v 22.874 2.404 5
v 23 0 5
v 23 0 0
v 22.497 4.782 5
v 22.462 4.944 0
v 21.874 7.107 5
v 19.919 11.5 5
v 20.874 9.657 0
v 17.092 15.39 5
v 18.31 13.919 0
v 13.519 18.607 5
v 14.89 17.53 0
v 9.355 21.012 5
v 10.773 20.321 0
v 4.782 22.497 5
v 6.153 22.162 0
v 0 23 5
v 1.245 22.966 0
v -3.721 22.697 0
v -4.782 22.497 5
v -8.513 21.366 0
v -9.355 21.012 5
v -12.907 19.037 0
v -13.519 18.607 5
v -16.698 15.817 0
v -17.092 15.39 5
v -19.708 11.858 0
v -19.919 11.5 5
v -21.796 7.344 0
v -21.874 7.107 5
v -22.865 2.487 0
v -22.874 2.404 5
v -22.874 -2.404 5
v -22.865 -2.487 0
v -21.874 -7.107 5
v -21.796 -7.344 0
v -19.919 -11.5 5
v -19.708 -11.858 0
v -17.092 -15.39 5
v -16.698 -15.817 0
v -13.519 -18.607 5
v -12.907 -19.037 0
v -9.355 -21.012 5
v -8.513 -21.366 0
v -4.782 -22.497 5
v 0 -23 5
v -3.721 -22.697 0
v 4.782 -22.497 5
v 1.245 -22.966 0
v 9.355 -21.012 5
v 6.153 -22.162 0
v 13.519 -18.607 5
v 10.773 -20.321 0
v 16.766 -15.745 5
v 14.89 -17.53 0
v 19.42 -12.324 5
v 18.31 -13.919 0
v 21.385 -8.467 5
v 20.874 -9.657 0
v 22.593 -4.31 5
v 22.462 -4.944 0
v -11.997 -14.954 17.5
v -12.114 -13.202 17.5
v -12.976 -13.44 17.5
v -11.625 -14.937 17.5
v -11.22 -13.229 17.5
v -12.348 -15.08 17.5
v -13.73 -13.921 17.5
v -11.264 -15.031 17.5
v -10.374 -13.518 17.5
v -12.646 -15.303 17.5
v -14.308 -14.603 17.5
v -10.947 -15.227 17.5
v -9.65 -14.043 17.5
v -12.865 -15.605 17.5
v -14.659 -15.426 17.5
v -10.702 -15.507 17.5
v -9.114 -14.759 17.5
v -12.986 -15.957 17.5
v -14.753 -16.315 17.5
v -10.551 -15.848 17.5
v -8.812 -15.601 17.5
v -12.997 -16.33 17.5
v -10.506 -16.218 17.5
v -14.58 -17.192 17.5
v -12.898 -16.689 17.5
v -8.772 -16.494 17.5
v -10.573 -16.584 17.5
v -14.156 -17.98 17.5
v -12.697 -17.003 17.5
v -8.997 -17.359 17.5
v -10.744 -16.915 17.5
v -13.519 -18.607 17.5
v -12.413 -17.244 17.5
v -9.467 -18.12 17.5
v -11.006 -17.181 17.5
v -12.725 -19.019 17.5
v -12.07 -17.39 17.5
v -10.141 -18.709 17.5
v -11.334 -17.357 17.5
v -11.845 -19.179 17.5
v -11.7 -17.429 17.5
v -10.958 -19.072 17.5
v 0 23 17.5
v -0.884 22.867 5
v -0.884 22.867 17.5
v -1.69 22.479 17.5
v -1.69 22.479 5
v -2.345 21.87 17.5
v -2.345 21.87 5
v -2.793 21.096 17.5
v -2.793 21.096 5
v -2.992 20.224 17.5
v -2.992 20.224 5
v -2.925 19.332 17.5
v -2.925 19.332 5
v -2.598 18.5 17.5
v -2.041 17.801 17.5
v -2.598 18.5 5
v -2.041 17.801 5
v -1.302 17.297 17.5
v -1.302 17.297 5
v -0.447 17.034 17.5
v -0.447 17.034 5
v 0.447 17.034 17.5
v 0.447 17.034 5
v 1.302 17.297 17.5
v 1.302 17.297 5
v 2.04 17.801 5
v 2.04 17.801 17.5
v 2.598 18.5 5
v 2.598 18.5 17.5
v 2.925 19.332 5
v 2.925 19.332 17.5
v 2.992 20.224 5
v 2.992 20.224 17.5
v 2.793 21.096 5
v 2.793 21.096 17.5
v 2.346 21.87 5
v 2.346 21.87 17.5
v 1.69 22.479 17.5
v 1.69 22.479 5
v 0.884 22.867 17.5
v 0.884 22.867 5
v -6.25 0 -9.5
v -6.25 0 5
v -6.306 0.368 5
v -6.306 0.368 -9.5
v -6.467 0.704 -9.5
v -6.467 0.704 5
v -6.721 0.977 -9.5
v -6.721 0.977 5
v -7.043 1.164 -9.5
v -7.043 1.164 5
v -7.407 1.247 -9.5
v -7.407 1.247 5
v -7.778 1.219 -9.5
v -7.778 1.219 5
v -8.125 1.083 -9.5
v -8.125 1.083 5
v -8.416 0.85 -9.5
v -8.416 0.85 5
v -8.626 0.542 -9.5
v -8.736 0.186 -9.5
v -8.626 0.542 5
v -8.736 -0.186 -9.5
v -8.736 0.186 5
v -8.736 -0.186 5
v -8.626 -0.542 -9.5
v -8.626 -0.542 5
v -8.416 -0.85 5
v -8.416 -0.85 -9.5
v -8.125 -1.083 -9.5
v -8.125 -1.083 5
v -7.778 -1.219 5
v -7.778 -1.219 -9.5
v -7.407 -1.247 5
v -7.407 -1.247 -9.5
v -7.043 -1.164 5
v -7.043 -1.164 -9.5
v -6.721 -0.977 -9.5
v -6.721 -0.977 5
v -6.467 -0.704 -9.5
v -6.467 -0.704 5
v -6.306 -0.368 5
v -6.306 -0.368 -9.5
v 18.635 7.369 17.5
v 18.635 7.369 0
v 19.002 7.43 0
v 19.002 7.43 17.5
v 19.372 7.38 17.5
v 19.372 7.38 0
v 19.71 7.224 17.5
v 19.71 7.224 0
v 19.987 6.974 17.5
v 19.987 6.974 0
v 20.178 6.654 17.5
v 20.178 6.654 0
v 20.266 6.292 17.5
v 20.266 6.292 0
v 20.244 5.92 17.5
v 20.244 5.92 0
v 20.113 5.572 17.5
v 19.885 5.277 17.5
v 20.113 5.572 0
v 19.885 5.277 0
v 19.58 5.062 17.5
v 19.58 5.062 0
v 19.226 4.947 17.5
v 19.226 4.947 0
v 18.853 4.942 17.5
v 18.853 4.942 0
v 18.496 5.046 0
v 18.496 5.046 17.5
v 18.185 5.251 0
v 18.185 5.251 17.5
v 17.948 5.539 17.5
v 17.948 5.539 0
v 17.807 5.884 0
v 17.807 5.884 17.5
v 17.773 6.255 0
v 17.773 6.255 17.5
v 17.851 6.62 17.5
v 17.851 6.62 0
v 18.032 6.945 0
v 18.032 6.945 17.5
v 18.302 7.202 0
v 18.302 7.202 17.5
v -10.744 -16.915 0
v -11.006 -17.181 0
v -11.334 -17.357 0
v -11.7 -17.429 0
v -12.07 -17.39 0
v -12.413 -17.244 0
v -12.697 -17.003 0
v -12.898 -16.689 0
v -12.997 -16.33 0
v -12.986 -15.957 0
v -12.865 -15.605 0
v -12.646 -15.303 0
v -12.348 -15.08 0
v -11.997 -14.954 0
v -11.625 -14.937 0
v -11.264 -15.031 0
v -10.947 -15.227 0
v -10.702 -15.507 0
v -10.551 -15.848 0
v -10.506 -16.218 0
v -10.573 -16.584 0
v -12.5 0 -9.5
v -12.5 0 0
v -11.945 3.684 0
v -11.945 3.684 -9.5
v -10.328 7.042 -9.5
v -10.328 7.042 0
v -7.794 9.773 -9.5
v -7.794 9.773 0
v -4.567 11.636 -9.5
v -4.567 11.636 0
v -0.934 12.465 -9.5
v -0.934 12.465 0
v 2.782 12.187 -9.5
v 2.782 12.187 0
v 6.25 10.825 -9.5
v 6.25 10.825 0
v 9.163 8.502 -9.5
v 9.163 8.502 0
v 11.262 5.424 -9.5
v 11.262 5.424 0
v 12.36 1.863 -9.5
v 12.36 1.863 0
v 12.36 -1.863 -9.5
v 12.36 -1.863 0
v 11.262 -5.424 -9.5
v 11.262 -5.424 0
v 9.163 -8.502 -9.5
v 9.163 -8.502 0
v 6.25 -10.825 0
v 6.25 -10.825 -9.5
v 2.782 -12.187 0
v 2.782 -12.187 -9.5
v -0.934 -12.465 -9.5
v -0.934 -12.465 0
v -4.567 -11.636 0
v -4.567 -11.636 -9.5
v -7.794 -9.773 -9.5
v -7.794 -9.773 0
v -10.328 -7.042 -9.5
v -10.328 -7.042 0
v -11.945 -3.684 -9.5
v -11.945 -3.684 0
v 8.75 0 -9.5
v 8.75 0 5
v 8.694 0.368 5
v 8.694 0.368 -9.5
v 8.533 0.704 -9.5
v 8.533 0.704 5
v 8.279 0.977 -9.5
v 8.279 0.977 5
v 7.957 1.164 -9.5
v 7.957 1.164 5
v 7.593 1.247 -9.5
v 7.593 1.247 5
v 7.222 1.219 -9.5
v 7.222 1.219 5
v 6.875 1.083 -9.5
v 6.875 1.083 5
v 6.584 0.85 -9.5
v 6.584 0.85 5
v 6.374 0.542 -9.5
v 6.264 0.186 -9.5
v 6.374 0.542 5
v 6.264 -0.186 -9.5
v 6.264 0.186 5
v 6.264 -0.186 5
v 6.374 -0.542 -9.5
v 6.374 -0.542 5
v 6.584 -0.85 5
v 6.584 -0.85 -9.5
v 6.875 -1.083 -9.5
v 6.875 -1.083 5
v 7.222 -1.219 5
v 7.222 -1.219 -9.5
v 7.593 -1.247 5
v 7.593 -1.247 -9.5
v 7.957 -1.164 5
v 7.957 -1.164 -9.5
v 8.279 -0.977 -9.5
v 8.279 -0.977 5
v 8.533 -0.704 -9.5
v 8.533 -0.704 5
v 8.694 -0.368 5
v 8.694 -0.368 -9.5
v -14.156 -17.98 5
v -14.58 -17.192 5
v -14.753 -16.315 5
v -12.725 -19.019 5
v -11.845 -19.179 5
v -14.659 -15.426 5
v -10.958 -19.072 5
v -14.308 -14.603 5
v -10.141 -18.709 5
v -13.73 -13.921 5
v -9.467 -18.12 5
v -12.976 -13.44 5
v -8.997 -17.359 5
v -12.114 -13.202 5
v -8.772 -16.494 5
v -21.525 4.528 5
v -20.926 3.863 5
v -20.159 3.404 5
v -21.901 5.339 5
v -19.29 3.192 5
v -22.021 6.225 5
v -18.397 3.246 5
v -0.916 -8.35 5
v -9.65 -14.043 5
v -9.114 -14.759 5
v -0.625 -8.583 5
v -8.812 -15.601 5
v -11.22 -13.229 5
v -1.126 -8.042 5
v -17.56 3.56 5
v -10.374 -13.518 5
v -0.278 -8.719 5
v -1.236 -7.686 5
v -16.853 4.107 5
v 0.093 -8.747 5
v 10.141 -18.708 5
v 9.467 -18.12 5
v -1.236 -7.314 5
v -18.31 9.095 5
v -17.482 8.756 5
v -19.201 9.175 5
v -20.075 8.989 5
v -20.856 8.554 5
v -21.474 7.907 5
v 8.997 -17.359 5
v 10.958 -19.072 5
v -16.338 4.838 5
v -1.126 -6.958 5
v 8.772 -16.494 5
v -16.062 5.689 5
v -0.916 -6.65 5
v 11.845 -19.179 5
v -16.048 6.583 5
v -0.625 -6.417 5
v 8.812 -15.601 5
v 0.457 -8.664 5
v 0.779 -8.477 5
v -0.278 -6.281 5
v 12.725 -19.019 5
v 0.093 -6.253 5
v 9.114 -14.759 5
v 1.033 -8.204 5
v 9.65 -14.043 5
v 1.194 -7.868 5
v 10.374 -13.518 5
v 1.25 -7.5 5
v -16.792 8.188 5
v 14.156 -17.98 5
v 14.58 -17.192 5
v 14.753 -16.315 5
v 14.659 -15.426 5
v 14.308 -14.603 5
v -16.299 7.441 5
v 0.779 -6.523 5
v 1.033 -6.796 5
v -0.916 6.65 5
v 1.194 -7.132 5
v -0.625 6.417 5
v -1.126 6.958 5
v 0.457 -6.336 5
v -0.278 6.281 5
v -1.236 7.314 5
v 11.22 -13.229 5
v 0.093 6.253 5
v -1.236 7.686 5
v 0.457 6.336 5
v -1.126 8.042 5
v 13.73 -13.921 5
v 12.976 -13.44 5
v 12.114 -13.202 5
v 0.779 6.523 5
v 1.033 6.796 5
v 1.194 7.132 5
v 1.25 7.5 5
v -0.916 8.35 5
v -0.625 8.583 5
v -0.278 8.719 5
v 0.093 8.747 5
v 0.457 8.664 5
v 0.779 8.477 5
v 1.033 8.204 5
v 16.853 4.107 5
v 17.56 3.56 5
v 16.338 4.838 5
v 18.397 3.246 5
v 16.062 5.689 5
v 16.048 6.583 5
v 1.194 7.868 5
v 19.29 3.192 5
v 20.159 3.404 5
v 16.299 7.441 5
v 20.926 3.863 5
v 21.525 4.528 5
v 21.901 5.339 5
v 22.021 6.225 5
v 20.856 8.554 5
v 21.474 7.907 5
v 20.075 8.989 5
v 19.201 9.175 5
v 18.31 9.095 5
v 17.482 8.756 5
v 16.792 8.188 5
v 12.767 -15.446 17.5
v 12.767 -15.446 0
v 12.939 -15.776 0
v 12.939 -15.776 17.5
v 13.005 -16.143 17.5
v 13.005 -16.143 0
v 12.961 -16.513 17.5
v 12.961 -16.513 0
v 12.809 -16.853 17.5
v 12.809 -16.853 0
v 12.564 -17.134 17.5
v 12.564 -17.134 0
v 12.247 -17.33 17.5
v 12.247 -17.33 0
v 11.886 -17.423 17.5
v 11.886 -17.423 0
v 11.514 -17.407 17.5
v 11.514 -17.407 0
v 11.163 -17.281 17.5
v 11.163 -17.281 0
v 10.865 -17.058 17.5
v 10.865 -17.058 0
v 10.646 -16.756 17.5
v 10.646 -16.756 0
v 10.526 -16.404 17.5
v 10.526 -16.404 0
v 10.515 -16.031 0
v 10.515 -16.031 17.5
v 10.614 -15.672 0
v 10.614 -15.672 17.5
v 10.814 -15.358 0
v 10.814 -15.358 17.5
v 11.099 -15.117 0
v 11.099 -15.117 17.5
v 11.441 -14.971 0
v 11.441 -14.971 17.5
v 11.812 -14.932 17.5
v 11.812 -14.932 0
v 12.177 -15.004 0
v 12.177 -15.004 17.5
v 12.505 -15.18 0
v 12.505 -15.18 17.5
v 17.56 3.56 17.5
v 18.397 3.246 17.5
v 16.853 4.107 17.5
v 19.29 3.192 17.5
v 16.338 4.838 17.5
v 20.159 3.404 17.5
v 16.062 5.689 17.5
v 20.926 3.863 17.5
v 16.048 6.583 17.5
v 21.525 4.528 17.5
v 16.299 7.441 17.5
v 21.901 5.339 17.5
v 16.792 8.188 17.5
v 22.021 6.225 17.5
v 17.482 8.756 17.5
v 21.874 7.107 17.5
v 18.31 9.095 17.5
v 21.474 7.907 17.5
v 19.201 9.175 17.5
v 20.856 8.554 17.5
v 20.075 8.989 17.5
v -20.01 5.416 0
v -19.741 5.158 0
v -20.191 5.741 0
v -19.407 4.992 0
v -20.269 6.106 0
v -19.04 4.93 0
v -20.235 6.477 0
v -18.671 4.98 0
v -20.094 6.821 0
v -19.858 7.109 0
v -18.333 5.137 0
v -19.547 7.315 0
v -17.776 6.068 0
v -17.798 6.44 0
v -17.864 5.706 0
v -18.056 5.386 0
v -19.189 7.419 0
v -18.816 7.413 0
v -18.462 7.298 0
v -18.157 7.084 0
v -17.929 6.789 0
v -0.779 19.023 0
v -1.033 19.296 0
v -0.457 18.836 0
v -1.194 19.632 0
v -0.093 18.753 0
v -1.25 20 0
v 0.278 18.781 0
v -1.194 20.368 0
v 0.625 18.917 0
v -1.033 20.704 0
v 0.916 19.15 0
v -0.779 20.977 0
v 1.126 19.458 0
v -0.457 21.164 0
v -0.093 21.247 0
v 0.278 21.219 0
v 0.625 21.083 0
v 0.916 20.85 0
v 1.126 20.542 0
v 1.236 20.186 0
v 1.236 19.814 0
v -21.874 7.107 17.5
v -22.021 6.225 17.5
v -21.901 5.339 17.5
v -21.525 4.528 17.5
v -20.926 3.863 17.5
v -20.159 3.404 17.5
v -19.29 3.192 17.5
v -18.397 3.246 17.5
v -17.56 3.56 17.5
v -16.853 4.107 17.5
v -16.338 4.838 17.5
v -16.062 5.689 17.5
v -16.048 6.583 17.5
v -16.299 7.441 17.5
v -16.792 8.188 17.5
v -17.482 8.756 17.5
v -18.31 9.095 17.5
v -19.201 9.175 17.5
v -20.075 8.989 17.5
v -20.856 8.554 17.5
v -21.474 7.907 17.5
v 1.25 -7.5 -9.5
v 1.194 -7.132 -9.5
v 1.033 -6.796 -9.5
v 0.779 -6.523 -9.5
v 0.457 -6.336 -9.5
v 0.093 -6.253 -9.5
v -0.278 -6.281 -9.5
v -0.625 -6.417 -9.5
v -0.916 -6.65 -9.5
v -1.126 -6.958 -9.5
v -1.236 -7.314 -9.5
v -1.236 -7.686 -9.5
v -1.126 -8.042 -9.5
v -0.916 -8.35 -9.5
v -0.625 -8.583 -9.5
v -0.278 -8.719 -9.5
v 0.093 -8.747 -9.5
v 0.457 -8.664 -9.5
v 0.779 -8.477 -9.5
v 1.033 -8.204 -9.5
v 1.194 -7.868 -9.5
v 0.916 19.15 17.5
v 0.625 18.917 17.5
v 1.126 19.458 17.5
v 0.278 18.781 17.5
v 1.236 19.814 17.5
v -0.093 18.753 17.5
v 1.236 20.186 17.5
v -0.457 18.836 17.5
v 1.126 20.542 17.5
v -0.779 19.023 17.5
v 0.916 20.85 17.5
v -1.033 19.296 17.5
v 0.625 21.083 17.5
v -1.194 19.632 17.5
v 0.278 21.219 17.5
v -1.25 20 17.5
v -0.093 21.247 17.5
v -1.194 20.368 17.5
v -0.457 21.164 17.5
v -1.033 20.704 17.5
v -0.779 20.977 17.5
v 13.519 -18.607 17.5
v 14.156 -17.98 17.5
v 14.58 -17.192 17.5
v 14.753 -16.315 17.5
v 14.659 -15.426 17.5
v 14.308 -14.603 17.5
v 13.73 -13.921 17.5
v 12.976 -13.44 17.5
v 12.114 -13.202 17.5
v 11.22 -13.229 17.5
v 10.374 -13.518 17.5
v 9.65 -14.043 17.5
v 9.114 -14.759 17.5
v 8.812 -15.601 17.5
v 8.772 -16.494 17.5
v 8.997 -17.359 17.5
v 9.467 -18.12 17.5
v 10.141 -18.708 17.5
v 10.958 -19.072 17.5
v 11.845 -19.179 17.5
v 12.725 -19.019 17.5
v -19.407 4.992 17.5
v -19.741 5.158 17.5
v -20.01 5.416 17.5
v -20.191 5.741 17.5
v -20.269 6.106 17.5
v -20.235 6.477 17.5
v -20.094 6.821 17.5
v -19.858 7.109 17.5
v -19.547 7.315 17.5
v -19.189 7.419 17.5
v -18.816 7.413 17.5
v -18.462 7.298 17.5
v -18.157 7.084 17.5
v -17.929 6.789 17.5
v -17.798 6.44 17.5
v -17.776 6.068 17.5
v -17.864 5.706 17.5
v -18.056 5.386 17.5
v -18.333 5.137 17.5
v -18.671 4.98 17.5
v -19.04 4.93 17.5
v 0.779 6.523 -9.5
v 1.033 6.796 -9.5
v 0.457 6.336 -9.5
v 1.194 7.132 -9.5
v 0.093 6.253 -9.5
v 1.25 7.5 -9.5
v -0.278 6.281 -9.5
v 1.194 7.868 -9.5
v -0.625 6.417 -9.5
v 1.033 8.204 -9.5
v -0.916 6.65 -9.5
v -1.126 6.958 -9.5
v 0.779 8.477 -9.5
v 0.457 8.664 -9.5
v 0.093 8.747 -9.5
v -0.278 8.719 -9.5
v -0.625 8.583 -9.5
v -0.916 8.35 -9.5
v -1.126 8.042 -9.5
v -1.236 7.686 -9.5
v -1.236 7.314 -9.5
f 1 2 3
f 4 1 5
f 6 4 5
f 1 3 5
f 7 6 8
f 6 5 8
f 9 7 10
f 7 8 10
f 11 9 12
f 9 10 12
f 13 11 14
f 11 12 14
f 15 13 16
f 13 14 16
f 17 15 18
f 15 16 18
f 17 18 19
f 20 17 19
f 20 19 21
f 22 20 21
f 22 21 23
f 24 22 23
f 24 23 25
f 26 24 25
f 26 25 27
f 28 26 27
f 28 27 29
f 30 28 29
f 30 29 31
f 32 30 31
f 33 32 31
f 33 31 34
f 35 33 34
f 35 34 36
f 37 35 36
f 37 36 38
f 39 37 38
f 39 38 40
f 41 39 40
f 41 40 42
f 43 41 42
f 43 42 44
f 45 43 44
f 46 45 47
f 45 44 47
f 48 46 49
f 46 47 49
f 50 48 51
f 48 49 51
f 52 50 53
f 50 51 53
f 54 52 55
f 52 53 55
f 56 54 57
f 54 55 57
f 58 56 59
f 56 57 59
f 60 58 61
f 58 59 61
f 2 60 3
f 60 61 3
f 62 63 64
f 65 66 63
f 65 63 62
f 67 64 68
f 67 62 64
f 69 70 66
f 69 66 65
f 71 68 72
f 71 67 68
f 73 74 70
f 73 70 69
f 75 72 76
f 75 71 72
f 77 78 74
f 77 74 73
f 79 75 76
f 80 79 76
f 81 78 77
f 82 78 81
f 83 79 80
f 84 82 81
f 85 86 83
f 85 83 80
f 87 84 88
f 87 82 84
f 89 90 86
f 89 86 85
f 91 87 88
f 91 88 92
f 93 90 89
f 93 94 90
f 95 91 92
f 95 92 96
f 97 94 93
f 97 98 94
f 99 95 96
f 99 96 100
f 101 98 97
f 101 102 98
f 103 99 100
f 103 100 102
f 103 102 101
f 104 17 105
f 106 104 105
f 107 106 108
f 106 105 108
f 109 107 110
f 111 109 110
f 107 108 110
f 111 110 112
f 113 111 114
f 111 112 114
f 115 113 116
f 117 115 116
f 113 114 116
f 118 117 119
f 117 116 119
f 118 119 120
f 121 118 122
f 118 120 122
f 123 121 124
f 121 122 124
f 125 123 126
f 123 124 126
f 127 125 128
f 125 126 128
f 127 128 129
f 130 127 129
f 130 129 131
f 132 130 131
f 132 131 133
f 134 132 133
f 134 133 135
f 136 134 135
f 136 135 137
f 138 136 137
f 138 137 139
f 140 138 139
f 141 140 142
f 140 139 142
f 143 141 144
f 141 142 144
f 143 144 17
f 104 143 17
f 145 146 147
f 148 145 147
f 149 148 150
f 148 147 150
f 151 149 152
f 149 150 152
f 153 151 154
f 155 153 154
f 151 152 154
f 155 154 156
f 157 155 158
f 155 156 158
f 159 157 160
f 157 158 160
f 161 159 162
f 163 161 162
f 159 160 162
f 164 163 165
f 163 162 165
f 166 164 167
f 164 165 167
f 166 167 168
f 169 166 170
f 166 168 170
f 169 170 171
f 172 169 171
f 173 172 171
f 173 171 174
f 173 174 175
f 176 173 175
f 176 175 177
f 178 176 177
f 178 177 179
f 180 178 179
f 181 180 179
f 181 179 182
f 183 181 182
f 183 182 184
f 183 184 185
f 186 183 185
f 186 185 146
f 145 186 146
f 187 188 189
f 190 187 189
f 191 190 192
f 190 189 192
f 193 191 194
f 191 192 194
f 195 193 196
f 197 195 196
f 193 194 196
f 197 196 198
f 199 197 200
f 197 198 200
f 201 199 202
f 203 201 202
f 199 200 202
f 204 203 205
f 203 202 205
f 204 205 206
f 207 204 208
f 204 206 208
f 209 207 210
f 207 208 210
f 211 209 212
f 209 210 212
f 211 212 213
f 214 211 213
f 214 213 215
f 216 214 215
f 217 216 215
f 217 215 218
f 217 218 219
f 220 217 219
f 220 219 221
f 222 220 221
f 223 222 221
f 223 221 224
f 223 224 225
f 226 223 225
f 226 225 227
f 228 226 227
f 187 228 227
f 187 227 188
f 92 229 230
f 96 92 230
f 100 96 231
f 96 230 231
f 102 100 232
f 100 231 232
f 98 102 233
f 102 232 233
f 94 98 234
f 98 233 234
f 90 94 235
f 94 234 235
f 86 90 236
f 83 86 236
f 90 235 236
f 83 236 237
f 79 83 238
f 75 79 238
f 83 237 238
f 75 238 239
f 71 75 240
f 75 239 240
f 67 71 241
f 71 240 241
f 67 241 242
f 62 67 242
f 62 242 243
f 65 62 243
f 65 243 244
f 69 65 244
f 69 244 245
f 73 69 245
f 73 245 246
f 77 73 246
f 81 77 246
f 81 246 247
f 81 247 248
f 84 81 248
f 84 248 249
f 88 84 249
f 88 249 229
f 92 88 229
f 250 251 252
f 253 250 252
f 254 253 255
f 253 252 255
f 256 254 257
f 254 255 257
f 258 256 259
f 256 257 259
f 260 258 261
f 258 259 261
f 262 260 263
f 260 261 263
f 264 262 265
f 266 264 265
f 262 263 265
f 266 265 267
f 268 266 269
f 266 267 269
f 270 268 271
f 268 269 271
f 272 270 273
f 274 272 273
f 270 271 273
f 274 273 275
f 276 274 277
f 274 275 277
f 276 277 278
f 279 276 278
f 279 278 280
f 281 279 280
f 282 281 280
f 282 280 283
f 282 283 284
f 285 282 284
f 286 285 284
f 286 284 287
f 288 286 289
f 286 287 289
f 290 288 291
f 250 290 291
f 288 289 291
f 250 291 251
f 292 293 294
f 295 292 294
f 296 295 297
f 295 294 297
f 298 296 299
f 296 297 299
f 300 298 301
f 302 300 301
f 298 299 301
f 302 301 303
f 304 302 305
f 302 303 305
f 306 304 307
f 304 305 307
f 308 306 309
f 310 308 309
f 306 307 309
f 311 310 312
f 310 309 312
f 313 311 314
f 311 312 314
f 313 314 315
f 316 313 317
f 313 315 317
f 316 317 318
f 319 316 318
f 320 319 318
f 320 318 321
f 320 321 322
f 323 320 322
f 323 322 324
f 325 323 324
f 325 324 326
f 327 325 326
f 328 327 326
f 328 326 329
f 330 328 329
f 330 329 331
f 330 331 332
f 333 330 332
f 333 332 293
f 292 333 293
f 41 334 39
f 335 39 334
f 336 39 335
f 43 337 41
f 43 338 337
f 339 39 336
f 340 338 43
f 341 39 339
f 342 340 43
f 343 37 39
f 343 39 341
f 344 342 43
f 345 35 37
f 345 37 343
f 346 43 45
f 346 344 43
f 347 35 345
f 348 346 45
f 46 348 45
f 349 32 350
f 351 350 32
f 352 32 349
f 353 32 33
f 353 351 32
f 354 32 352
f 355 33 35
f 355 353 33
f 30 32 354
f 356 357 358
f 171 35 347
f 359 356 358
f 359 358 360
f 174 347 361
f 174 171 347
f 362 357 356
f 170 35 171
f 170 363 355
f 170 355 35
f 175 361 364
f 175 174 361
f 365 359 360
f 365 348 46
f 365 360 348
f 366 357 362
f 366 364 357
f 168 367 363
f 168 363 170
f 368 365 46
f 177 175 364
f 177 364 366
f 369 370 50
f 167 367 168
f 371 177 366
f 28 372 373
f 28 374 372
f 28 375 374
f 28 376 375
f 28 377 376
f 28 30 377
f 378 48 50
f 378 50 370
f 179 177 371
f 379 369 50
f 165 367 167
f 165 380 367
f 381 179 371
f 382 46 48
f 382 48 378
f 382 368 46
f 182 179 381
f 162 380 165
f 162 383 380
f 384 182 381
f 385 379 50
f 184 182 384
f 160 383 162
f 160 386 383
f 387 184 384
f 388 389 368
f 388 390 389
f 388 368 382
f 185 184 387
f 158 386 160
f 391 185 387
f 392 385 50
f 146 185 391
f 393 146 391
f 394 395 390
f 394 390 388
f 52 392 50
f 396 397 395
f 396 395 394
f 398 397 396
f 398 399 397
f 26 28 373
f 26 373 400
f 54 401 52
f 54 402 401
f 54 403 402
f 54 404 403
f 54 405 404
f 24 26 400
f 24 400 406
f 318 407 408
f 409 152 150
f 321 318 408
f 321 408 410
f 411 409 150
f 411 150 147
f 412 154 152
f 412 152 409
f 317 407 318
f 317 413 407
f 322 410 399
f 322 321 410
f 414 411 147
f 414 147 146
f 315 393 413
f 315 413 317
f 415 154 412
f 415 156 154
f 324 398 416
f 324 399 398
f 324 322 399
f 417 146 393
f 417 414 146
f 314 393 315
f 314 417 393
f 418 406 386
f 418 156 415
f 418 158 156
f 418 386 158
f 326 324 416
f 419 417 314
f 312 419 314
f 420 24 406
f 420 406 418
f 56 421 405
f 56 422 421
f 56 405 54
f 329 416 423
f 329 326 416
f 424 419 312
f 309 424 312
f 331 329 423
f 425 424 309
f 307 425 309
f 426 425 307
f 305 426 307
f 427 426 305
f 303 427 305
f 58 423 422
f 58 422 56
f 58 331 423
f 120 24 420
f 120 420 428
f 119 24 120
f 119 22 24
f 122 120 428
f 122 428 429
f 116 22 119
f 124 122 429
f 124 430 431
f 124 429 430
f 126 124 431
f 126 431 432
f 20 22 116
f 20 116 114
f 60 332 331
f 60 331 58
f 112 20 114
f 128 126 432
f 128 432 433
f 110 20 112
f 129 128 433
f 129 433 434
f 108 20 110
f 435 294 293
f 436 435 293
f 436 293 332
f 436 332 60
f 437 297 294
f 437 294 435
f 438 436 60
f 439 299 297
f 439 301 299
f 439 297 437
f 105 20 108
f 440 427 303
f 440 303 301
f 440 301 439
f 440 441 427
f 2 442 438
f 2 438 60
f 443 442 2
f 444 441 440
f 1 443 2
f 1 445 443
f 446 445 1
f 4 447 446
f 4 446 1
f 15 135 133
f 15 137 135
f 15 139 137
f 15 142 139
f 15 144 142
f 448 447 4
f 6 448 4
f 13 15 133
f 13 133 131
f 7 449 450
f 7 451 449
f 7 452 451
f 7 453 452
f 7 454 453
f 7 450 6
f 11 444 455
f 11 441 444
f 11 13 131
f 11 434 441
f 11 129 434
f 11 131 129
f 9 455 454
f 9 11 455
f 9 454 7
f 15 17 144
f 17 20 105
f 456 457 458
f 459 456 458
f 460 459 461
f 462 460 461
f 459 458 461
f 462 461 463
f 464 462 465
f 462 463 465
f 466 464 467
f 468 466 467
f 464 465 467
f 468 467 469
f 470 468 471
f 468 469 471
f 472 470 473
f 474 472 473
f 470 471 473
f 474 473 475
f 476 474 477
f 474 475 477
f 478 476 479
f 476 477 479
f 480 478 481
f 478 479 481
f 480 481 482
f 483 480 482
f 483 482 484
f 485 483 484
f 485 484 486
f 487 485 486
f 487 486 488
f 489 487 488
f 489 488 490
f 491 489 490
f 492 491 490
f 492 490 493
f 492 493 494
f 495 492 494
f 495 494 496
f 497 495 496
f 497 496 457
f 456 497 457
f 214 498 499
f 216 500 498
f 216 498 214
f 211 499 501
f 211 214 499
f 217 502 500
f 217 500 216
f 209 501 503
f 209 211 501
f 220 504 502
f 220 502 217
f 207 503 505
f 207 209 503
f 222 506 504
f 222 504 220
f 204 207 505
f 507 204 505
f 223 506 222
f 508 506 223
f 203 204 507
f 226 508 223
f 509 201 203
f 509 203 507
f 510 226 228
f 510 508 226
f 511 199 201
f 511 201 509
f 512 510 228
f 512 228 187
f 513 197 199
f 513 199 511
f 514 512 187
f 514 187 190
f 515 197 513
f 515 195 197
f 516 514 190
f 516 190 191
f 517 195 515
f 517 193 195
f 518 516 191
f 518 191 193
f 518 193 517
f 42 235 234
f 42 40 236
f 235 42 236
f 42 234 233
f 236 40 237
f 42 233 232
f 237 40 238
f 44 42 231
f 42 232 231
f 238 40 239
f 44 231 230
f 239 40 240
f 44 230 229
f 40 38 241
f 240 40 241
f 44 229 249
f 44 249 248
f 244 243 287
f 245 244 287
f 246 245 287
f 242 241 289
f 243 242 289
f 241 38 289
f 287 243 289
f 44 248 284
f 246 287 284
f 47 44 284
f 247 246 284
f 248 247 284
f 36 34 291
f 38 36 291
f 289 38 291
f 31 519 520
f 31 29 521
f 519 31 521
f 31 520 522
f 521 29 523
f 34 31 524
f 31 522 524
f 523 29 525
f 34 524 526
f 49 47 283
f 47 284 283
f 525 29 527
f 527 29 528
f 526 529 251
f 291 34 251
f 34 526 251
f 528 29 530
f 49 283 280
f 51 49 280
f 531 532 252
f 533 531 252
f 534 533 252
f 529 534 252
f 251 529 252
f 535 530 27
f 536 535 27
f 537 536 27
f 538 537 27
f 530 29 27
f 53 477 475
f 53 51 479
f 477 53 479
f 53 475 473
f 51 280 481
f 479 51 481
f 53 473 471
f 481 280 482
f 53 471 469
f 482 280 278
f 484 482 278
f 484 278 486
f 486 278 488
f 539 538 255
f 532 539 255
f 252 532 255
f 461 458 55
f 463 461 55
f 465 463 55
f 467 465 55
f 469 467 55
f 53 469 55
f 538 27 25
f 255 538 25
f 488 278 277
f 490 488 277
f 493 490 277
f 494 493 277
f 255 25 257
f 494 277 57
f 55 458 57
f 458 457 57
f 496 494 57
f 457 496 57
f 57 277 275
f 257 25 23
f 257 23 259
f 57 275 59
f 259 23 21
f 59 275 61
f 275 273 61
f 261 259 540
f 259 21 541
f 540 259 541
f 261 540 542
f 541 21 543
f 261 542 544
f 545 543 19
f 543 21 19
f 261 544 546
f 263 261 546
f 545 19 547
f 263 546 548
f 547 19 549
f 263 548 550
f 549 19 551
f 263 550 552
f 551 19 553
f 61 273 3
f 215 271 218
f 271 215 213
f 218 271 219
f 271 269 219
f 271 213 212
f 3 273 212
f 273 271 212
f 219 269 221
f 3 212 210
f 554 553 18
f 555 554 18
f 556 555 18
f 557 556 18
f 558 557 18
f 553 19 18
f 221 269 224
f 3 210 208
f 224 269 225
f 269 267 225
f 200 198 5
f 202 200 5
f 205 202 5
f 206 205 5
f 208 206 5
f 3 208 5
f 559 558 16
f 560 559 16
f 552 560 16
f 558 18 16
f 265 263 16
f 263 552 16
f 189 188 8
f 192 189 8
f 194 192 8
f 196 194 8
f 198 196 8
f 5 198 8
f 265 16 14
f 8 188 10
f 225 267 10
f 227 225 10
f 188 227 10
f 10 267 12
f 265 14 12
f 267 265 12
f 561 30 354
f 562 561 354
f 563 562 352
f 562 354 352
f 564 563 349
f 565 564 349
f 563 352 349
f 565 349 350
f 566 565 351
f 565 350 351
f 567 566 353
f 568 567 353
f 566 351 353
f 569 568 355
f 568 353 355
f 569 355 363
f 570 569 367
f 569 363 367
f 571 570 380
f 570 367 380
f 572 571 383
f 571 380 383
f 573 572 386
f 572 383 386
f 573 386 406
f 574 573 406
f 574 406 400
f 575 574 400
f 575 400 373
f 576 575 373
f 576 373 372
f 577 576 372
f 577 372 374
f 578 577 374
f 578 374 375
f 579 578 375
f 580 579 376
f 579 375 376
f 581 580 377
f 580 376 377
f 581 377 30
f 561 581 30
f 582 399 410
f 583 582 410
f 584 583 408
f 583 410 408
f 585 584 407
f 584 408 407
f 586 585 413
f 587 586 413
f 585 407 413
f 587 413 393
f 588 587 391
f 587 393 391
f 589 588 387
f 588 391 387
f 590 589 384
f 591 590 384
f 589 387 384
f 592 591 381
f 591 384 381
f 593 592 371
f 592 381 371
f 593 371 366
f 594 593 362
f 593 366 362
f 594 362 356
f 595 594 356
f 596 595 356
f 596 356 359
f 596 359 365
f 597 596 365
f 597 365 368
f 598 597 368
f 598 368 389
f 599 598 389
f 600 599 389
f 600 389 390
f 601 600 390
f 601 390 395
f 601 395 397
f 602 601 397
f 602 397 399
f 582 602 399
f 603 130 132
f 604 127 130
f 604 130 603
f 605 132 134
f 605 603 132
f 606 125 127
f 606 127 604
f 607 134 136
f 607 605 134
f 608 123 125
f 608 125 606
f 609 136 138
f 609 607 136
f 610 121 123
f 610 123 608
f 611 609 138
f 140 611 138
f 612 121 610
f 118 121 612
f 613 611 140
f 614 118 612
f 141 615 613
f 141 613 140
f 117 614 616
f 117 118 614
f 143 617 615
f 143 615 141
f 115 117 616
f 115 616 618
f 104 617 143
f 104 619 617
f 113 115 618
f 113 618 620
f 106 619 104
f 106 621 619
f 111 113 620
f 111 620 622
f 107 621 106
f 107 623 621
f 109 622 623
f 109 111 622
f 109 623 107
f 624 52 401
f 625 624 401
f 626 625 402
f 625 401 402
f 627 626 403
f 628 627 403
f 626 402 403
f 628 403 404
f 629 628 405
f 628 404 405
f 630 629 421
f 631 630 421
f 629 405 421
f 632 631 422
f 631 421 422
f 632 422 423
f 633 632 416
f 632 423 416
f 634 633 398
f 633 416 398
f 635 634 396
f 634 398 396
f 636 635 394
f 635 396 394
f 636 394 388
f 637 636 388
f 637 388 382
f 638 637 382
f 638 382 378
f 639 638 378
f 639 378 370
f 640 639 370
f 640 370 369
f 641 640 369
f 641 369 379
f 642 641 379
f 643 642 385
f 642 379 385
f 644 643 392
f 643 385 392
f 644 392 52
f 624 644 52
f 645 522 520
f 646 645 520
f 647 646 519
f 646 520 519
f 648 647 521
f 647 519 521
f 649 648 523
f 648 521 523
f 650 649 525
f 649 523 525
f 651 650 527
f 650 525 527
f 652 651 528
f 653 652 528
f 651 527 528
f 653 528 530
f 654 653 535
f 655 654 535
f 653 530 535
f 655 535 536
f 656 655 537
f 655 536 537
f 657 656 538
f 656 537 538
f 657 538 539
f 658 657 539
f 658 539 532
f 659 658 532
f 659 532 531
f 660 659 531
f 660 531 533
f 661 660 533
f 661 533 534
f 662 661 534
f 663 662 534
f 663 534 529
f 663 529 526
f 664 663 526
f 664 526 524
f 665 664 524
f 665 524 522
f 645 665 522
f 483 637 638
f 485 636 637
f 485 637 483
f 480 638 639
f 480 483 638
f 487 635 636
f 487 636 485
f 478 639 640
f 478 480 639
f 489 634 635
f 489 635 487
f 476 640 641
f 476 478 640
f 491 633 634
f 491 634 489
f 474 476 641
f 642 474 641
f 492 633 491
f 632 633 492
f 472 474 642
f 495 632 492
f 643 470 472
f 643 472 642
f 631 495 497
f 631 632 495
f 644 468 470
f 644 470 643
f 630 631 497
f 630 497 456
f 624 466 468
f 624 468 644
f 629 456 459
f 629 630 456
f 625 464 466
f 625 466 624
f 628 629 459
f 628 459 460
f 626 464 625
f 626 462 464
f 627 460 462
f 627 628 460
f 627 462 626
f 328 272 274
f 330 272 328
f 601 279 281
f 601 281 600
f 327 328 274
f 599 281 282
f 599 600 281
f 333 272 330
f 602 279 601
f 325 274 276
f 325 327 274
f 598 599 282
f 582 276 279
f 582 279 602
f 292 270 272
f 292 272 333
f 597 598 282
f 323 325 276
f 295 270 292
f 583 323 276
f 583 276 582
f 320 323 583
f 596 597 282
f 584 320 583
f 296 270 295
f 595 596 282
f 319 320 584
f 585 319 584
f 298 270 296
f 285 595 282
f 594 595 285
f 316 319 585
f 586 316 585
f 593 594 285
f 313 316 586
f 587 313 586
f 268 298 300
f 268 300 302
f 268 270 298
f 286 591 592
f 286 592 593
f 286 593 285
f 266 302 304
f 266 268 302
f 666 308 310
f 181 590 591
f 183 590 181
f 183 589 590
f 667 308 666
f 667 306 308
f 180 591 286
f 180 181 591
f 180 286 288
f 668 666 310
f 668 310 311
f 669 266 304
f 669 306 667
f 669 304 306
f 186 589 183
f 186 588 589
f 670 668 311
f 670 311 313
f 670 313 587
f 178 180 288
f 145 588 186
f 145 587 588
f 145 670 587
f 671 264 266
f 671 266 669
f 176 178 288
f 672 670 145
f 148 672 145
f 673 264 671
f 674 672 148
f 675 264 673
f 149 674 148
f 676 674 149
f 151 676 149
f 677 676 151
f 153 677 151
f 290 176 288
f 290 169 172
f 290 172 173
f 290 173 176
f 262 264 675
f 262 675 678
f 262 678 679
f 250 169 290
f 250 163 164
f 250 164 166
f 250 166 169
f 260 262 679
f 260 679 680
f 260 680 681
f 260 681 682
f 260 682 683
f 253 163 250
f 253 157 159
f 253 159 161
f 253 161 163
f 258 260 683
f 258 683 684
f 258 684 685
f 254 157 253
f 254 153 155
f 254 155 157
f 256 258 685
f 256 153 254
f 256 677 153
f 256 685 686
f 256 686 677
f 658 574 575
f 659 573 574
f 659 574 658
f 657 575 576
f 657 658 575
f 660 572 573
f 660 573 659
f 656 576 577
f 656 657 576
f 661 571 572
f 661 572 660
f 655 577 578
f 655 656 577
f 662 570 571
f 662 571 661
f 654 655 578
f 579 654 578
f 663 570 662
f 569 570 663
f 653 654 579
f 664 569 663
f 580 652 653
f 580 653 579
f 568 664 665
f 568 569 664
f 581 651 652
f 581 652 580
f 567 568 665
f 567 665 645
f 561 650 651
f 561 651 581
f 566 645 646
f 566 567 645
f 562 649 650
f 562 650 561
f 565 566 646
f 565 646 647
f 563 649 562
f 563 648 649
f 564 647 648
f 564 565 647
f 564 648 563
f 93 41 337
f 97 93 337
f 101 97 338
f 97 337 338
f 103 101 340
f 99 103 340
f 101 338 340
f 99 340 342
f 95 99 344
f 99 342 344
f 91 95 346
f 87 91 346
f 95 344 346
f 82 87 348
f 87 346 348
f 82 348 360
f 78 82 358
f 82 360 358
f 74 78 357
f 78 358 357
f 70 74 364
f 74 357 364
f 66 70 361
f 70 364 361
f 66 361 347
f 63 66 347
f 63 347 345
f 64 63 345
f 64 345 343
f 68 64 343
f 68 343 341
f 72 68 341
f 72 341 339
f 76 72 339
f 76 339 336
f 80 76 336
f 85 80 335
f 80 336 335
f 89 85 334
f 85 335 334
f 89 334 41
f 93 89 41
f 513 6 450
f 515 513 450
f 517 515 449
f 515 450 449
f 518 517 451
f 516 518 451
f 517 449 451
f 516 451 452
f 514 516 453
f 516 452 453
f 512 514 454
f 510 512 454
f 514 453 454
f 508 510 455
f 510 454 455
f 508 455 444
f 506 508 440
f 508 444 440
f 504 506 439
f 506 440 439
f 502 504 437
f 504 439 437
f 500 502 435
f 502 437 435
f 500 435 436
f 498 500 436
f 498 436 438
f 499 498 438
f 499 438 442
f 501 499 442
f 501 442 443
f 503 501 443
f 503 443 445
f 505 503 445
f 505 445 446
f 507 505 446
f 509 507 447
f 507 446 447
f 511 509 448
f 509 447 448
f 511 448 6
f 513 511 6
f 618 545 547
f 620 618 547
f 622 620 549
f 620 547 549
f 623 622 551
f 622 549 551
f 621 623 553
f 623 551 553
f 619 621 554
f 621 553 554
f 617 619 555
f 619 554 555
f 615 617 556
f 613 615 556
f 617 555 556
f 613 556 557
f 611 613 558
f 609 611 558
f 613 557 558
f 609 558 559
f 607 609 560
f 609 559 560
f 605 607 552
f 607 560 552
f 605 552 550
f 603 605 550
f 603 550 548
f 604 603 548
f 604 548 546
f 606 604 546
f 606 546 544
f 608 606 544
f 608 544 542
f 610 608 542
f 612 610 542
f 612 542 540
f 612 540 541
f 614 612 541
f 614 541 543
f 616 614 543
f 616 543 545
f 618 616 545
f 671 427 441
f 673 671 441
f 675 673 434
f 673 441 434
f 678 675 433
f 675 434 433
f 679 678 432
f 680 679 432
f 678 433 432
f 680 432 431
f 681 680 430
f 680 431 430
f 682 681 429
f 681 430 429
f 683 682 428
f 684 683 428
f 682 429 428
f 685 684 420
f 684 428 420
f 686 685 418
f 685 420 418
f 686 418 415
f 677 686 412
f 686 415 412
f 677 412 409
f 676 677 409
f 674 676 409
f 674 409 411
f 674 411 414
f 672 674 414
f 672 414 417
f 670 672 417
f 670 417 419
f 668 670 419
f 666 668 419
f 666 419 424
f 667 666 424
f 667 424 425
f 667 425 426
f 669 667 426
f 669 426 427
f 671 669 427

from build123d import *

# Parameters (mm, degrees)
SKETCH1_R           = 23
BOSS_EXTRUDE1_DEPTH = 5
SKETCH2_R           = 3
BOSS_EXTRUDE2_DEPTH = 12.5
SKETCH3_R           = 12.5
BOSS_EXTRUDE3_DEPTH = 9.5
M3_TAPPED_HOLE1_D   = 2.5
CIRPATTERN1_COUNT   = 5
M3_TAPPED_HOLE2_D   = 2.5


with BuildPart() as part:
    # Sketch1 → Boss-Extrude1 (new body)
    with BuildSketch(Plane.XY):
        Circle(SKETCH1_R)
    extrude(amount=BOSS_EXTRUDE1_DEPTH)

    # Sketch2 → Boss-Extrude2 (add)
    with BuildSketch(Plane.XY.offset(5)):
        with Locations(Location((0, 20, 0), (0, 0, 89.999498322))):
            Circle(SKETCH2_R)
        with Locations(Location((19.021130326, 6.180339887, 0), (0, 0, 17.999498258))):
            Circle(SKETCH2_R)
        with Locations(Location((11.755705046, -16.180339887, 0), (0, 0, 305.999498339))):
            Circle(SKETCH2_R)
        with Locations(Location((-11.755705046, -16.180339887, 0), (0, 0, 233.999498303))):
            Circle(SKETCH2_R)
        with Locations(Location((-19.021130326, 6.180339887, 0), (0, 0, 161.999499453))):
            Circle(SKETCH2_R)
    extrude(amount=BOSS_EXTRUDE2_DEPTH)

    # Sketch3 → Boss-Extrude3 (add)
    with BuildSketch(Plane(origin=(0, 0, 0), x_dir=(-1, 0, 0), z_dir=(0, 0, -1))):
        Circle(SKETCH3_R)
    extrude(amount=BOSS_EXTRUDE3_DEPTH)

    # M3 Tapped Hole1 (through all)
    with Locations(Plane.XY.offset(17.5)):
        with Locations((0, 20)):
            m3_tapped_hole1 = Hole(M3_TAPPED_HOLE1_D / 2)

    # CirPattern1: M3 Tapped Hole1 ×5 about axis
    cirpattern1_axis = Axis((0, 0, 0), (0, 0, 1))
    for i in range(1, CIRPATTERN1_COUNT):
        add(m3_tapped_hole1.rotate(cirpattern1_axis, i * 360 / CIRPATTERN1_COUNT), mode=Mode.SUBTRACT)

    # M3 Tapped Hole2 (through all)
    with Locations(Plane(origin=(0, 0, -9.5), x_dir=(-1, 0, 0), z_dir=(0, 0, -1))):
        with Locations((-7.5, 0), (0, 7.5), (7.5, 0), (0, -7.5)):
            Hole(M3_TAPPED_HOLE2_D / 2)


solid = part.part
